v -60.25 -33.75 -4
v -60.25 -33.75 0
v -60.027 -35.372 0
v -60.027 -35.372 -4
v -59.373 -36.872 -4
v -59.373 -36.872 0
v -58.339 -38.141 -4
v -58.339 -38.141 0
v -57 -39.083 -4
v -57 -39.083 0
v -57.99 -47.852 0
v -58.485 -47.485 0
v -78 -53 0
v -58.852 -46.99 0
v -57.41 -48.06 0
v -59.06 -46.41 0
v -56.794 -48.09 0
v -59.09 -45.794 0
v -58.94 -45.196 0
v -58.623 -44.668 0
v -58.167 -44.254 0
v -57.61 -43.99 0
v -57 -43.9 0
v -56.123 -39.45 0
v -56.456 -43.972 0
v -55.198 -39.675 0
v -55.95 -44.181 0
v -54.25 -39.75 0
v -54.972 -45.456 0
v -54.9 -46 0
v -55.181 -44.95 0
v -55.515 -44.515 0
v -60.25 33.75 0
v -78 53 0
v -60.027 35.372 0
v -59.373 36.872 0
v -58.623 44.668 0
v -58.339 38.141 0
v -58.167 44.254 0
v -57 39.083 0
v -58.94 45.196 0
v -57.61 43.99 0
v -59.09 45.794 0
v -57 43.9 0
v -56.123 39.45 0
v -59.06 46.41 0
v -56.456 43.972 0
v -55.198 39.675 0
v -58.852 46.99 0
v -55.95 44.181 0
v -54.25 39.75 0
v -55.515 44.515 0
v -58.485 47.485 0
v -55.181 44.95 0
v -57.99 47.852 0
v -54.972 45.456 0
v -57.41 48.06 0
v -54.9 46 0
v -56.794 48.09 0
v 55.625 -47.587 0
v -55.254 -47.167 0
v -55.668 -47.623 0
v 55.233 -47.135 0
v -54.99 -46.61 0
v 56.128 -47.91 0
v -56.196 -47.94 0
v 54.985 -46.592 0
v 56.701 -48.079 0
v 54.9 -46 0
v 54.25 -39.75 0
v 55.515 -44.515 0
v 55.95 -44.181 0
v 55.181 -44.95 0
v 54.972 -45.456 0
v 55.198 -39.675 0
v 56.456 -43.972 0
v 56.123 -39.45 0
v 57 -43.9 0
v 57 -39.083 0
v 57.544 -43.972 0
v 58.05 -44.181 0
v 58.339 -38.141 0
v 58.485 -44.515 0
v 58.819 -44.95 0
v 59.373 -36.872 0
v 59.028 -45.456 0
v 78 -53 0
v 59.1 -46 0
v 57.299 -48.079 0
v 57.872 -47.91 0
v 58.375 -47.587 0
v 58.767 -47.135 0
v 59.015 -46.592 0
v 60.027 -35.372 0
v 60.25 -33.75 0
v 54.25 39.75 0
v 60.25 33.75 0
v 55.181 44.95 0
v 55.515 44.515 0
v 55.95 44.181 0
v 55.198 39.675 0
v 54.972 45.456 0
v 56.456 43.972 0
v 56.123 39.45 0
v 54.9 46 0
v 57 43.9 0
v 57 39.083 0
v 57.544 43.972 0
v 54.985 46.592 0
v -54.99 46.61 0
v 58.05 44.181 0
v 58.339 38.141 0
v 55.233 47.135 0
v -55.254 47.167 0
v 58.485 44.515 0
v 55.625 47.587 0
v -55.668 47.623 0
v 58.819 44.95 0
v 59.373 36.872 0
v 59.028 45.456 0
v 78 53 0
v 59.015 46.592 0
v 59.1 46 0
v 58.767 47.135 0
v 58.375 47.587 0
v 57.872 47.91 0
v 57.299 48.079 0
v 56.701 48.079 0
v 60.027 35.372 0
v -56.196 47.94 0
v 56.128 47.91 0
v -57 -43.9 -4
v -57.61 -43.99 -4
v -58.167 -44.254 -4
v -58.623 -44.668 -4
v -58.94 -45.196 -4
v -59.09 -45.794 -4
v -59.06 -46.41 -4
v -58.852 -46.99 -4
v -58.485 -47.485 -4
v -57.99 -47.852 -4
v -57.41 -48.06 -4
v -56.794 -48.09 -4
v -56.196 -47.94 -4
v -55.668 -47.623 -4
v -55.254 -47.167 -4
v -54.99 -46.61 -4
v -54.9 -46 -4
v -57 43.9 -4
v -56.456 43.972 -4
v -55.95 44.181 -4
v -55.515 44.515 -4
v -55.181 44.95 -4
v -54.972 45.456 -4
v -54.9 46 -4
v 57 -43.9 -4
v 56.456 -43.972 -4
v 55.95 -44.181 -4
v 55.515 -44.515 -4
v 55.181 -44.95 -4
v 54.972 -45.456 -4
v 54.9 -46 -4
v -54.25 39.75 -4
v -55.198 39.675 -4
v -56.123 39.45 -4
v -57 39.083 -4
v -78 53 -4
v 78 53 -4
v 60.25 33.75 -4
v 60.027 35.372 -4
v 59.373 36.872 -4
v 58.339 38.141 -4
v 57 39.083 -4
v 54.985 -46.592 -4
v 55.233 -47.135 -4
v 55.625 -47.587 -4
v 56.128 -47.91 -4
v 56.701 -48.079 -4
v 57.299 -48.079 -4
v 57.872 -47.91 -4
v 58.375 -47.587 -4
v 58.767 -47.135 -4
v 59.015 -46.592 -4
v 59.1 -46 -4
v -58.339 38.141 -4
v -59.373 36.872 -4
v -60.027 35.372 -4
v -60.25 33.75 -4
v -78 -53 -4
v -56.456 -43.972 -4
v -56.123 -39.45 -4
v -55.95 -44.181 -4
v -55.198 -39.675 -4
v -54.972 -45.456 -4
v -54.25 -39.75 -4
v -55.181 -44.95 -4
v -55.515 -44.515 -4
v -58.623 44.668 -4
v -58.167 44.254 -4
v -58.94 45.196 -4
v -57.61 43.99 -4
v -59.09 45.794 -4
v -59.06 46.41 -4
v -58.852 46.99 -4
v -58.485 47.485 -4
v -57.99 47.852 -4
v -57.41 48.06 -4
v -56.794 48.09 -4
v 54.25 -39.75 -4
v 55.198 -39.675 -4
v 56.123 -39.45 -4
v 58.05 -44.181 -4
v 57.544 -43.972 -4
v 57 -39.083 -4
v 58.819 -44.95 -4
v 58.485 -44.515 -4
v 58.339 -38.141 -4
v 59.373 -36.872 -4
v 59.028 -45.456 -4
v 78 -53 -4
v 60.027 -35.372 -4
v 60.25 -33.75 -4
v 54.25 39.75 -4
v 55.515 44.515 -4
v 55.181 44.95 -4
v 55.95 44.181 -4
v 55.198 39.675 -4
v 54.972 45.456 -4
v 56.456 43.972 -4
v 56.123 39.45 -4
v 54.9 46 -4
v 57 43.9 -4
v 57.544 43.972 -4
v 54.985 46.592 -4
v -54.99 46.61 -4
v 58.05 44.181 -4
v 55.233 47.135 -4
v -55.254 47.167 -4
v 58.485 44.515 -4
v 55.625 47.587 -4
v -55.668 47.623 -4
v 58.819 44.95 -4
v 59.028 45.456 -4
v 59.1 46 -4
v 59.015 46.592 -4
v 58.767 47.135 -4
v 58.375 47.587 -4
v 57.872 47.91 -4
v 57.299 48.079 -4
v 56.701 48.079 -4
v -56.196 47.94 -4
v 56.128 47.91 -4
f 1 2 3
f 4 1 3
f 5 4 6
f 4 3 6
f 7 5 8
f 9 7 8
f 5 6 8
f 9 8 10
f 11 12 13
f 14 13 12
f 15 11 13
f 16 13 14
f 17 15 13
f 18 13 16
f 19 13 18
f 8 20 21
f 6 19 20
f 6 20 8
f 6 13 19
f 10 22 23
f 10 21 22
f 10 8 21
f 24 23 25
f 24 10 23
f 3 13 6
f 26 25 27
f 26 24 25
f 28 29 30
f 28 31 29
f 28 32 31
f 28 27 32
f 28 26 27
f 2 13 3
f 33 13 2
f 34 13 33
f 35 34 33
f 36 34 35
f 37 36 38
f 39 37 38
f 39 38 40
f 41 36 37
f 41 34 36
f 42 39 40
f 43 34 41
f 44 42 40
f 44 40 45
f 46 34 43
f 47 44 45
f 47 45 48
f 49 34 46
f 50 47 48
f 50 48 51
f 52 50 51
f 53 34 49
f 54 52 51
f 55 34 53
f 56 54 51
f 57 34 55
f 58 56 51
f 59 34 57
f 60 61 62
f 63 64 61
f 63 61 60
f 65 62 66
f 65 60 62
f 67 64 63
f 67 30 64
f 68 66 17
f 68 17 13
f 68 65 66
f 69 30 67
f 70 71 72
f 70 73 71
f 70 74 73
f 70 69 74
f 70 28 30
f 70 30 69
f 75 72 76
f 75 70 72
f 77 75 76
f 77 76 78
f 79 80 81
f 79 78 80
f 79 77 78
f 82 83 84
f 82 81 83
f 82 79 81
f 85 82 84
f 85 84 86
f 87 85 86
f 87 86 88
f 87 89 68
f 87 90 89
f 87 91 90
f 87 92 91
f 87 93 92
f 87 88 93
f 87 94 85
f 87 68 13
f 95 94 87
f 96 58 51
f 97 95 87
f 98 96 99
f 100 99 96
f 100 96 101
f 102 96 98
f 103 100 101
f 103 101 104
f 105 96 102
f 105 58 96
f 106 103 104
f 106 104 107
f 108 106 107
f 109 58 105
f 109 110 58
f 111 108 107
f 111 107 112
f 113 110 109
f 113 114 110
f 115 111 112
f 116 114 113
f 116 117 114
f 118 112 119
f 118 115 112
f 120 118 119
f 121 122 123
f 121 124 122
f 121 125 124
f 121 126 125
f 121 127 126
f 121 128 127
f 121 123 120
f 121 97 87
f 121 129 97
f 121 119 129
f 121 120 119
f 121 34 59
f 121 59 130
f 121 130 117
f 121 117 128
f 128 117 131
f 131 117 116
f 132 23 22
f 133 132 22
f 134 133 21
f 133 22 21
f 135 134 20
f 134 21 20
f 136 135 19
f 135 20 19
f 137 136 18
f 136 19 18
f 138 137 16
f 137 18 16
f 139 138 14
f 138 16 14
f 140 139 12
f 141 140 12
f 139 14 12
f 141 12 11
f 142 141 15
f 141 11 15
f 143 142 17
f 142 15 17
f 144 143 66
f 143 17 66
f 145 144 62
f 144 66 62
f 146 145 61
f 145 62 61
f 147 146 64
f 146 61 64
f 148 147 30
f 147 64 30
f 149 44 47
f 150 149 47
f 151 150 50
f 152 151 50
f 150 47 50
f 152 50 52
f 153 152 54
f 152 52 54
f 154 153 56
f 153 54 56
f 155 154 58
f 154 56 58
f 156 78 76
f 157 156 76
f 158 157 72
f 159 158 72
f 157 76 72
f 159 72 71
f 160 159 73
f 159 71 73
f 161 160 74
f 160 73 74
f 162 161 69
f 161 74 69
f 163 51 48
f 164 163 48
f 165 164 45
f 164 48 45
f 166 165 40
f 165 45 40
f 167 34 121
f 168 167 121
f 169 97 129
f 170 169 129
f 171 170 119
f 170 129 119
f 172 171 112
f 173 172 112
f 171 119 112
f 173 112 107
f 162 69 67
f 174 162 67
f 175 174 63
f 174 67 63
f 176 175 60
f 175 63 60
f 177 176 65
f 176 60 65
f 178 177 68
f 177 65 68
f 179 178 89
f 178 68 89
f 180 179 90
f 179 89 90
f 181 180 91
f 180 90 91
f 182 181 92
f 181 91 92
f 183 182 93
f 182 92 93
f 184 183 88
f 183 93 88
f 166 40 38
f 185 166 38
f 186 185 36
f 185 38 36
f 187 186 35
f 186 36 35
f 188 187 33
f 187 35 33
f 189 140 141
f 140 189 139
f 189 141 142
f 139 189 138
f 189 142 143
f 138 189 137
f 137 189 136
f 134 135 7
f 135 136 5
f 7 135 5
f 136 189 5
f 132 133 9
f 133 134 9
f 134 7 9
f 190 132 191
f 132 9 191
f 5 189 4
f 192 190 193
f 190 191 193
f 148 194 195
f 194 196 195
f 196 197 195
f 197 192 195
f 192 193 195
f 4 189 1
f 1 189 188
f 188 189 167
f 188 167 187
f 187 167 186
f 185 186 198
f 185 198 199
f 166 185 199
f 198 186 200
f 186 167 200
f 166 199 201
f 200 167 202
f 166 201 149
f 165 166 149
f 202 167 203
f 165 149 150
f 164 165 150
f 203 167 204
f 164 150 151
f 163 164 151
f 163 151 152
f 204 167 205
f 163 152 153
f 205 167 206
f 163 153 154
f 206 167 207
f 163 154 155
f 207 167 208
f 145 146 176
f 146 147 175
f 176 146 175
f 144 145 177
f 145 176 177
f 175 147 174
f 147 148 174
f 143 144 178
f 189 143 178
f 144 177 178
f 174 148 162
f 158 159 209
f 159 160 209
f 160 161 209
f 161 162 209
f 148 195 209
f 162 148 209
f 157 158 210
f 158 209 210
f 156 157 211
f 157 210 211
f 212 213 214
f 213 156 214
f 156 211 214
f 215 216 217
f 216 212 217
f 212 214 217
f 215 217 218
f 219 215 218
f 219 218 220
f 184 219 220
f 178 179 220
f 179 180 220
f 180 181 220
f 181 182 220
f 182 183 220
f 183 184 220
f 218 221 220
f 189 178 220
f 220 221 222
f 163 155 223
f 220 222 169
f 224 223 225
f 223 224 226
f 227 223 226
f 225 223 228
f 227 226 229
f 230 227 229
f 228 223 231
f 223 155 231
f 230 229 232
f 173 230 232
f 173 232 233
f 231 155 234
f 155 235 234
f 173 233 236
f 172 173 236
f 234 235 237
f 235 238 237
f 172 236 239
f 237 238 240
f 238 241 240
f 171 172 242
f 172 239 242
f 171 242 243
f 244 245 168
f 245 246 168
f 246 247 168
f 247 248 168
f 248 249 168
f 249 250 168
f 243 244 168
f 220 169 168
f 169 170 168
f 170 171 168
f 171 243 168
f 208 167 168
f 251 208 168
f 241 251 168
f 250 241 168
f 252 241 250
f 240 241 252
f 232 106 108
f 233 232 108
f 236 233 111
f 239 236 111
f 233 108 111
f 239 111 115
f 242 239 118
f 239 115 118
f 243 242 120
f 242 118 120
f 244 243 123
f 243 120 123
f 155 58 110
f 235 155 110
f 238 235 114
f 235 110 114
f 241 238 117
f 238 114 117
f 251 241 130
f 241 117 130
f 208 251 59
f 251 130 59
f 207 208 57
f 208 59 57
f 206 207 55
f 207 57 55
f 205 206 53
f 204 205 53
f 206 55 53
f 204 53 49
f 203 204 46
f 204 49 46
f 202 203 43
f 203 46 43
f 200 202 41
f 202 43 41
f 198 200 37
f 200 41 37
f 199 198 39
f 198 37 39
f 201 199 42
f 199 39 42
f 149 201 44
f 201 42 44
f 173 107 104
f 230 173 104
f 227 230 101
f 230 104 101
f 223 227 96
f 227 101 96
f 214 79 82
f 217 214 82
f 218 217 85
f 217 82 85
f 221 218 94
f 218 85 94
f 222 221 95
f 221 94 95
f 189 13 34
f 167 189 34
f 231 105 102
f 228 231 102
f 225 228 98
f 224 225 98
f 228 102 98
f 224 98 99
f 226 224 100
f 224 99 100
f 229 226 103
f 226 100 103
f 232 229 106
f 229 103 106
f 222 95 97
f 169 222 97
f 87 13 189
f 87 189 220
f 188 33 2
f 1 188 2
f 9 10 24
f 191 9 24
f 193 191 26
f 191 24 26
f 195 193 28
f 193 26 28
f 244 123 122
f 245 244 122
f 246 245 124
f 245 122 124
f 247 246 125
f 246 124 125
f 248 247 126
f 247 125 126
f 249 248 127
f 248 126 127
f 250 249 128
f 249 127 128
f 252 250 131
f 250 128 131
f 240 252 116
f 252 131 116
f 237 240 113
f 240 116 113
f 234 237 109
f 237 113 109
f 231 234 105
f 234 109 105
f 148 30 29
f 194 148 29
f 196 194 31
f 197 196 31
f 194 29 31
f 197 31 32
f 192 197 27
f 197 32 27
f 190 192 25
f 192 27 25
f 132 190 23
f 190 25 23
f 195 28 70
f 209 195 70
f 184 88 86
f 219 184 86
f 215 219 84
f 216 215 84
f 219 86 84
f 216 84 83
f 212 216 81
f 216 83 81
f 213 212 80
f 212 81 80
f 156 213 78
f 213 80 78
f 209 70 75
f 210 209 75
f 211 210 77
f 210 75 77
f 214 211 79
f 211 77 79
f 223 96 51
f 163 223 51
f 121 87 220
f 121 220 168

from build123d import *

# Parameters (mm, degrees)
SKETCH1_W           = 156
SKETCH1_H           = 106
BOSS_EXTRUDE1_DEPTH = 4
CUT_EXTRUDE1_REACH  = 96.387


with BuildPart() as part:
    # Sketch1 → Boss-Extrude1 (new body)
    with BuildSketch(Plane.XY):
        Rectangle(SKETCH1_W, SKETCH1_H)
    extrude(amount=-BOSS_EXTRUDE1_DEPTH)

    # Sketch2 → Cut-Extrude1 (cut, up to next)
    with BuildSketch(Plane.XY, mode=Mode.PRIVATE) as cut_extrude1_sk1:
        with BuildLine():
            ThreePointArc((60.25, 33.75), (59.373475383, 36.872498999), (57, 39.082682252))
            Line((57, 39.082682252), (57, -39.082682252))
            ThreePointArc((57, -39.082682252), (59.373475383, -36.872498999), (60.25, -33.75))
            Line((60.25, -33.75), (60.25, 33.75))
        make_face()
    cut_extrude1_tool1 = extrude(cut_extrude1_sk1.sketch, amount=-CUT_EXTRUDE1_REACH, mode=Mode.PRIVATE) & part.part
    # Sketch2 → Cut-Extrude1 (cut, up to next)
    with BuildSketch(Plane.XY, mode=Mode.PRIVATE) as cut_extrude1_sk2:
        with BuildLine():
            ThreePointArc((-54.25, 39.75), (-55.66490397, 39.580784403), (-57, 39.082682252))
            Line((-57, 39.082682252), (-57, -39.082682252))
            ThreePointArc((-57, -39.082682252), (-55.66490397, -39.580784403), (-54.25, -39.75))
            Line((-54.25, -39.75), (54.25, -39.75))
            ThreePointArc((54.25, -39.75), (55.66490397, -39.580784403), (57, -39.082682252))
            Line((57, -39.082682252), (57, 39.082682252))
            ThreePointArc((57, 39.082682252), (55.66490397, 39.580784403), (54.25, 39.75))
            Line((54.25, 39.75), (-54.25, 39.75))
        make_face()
    cut_extrude1_tool2 = extrude(cut_extrude1_sk2.sketch, amount=-CUT_EXTRUDE1_REACH, mode=Mode.PRIVATE) & part.part
    # Sketch2 → Cut-Extrude1 (cut, up to next)
    with BuildSketch(Plane.XY, mode=Mode.PRIVATE) as cut_extrude1_sk3:
        with BuildLine():
            Line((-57, -39.082682252), (-57, 39.082682252))
            ThreePointArc((-57, 39.082682252), (-59.373475383, 36.872498999), (-60.25, 33.75))
            Line((-60.25, 33.75), (-60.25, -33.75))
            ThreePointArc((-60.25, -33.75), (-59.373475383, -36.872498999), (-57, -39.082682252))
        make_face()
    cut_extrude1_tool3 = extrude(cut_extrude1_sk3.sketch, amount=-CUT_EXTRUDE1_REACH, mode=Mode.PRIVATE) & part.part
    # Sketch2 → Cut-Extrude1 (cut, up to next)
    with BuildSketch(Plane.XY, mode=Mode.PRIVATE) as cut_extrude1_sk4:
        with BuildLine():
            ThreePointArc((59.1, 46), (57, 48.1), (54.9, 46))
            Line((54.9, 46), (57, 46))
            Line((57, 46), (57, 43.9))
            ThreePointArc((57, 43.9), (58.48492424, 44.51507576), (59.1, 46))
        make_face()
    cut_extrude1_tool4 = extrude(cut_extrude1_sk4.sketch, amount=-CUT_EXTRUDE1_REACH, mode=Mode.PRIVATE) & part.part
    # Sketch2 → Cut-Extrude1 (cut, up to next)
    with BuildSketch(Plane.XY, mode=Mode.PRIVATE) as cut_extrude1_sk5:
        with BuildLine():
            Line((57, 46), (54.9, 46))
            ThreePointArc((54.9, 46), (55.51507576, 44.51507576), (57, 43.9))
            Line((57, 43.9), (57, 46))
        make_face()
    cut_extrude1_tool5 = extrude(cut_extrude1_sk5.sketch, amount=-CUT_EXTRUDE1_REACH, mode=Mode.PRIVATE) & part.part
    # Sketch2 → Cut-Extrude1 (cut, up to next)
    with BuildSketch(Plane.XY, mode=Mode.PRIVATE) as cut_extrude1_sk6:
        with BuildLine():
            ThreePointArc((59.1, 46), (57, 48.1), (54.9, 46))
            Line((54.9, 46), (57, 46))
            Line((57, 46), (57, 43.9))
            ThreePointArc((57, 43.9), (58.48492424, 44.51507576), (59.1, 46))
        make_face()
    cut_extrude1_tool6 = extrude(cut_extrude1_sk6.sketch, amount=-CUT_EXTRUDE1_REACH, mode=Mode.PRIVATE) & part.part
    # Sketch2 → Cut-Extrude1 (cut, up to next)
    with BuildSketch(Plane.XY, mode=Mode.PRIVATE) as cut_extrude1_sk7:
        with BuildLine():
            Line((57, 46), (54.9, 46))
            ThreePointArc((54.9, 46), (55.51507576, 44.51507576), (57, 43.9))
            Line((57, 43.9), (57, 46))
        make_face()
    cut_extrude1_tool7 = extrude(cut_extrude1_sk7.sketch, amount=-CUT_EXTRUDE1_REACH, mode=Mode.PRIVATE) & part.part
    # Sketch2 → Cut-Extrude1 (cut, up to next)
    with BuildSketch(Plane.XY, mode=Mode.PRIVATE) as cut_extrude1_sk8:
        with BuildLine():
            Line((-57, 43.9), (-57, 46))
            Line((-57, 46), (-54.9, 46))
            ThreePointArc((-54.9, 46), (-58.48492424, 47.48492424), (-57, 43.9))
        make_face()
    cut_extrude1_tool8 = extrude(cut_extrude1_sk8.sketch, amount=-CUT_EXTRUDE1_REACH, mode=Mode.PRIVATE) & part.part
    # Sketch2 → Cut-Extrude1 (cut, up to next)
    with BuildSketch(Plane.XY, mode=Mode.PRIVATE) as cut_extrude1_sk9:
        with BuildLine():
            Line((-54.9, 46), (-57, 46))
            Line((-57, 46), (-57, 43.9))
            ThreePointArc((-57, 43.9), (-55.51507576, 44.51507576), (-54.9, 46))
        make_face()
    cut_extrude1_tool9 = extrude(cut_extrude1_sk9.sketch, amount=-CUT_EXTRUDE1_REACH, mode=Mode.PRIVATE) & part.part
    # Sketch2 → Cut-Extrude1 (cut, up to next)
    with BuildSketch(Plane.XY, mode=Mode.PRIVATE) as cut_extrude1_sk10:
        with BuildLine():
            Line((-57, 43.9), (-57, 46))
            Line((-57, 46), (-54.9, 46))
            ThreePointArc((-54.9, 46), (-58.48492424, 47.48492424), (-57, 43.9))
        make_face()
    cut_extrude1_tool10 = extrude(cut_extrude1_sk10.sketch, amount=-CUT_EXTRUDE1_REACH, mode=Mode.PRIVATE) & part.part
    # Sketch2 → Cut-Extrude1 (cut, up to next)
    with BuildSketch(Plane.XY, mode=Mode.PRIVATE) as cut_extrude1_sk11:
        with BuildLine():
            Line((-54.9, 46), (-57, 46))
            Line((-57, 46), (-57, 43.9))
            ThreePointArc((-57, 43.9), (-55.51507576, 44.51507576), (-54.9, 46))
        make_face()
    cut_extrude1_tool11 = extrude(cut_extrude1_sk11.sketch, amount=-CUT_EXTRUDE1_REACH, mode=Mode.PRIVATE) & part.part
    # Sketch2 → Cut-Extrude1 (cut, up to next)
    with BuildSketch(Plane.XY, mode=Mode.PRIVATE) as cut_extrude1_sk12:
        with BuildLine():
            ThreePointArc((-54.9, -46), (-55.51507576, -44.51507576), (-57, -43.9))
            Line((-57, -43.9), (-57, -46))
            Line((-57, -46), (-54.9, -46))
        make_face()
    cut_extrude1_tool12 = extrude(cut_extrude1_sk12.sketch, amount=-CUT_EXTRUDE1_REACH, mode=Mode.PRIVATE) & part.part
    # Sketch2 → Cut-Extrude1 (cut, up to next)
    with BuildSketch(Plane.XY, mode=Mode.PRIVATE) as cut_extrude1_sk13:
        with BuildLine():
            Line((-57, -46), (-57, -43.9))
            ThreePointArc((-57, -43.9), (-58.48492424, -47.48492424), (-54.9, -46))
            Line((-54.9, -46), (-57, -46))
        make_face()
    cut_extrude1_tool13 = extrude(cut_extrude1_sk13.sketch, amount=-CUT_EXTRUDE1_REACH, mode=Mode.PRIVATE) & part.part
    # Sketch2 → Cut-Extrude1 (cut, up to next)
    with BuildSketch(Plane.XY, mode=Mode.PRIVATE) as cut_extrude1_sk14:
        with BuildLine():
            ThreePointArc((-54.9, -46), (-55.51507576, -44.51507576), (-57, -43.9))
            Line((-57, -43.9), (-57, -46))
            Line((-57, -46), (-54.9, -46))
        make_face()
    cut_extrude1_tool14 = extrude(cut_extrude1_sk14.sketch, amount=-CUT_EXTRUDE1_REACH, mode=Mode.PRIVATE) & part.part
    # Sketch2 → Cut-Extrude1 (cut, up to next)
    with BuildSketch(Plane.XY, mode=Mode.PRIVATE) as cut_extrude1_sk15:
        with BuildLine():
            Line((-57, -46), (-57, -43.9))
            ThreePointArc((-57, -43.9), (-58.48492424, -47.48492424), (-54.9, -46))
            Line((-54.9, -46), (-57, -46))
        make_face()
    cut_extrude1_tool15 = extrude(cut_extrude1_sk15.sketch, amount=-CUT_EXTRUDE1_REACH, mode=Mode.PRIVATE) & part.part
    # Sketch2 → Cut-Extrude1 (cut, up to next)
    with BuildSketch(Plane.XY, mode=Mode.PRIVATE) as cut_extrude1_sk16:
        with BuildLine():
            ThreePointArc((59.1, -46), (58.48492424, -44.51507576), (57, -43.9))
            Line((57, -43.9), (57, -46))
            Line((57, -46), (54.9, -46))
            ThreePointArc((54.9, -46), (57, -48.1), (59.1, -46))
        make_face()
    cut_extrude1_tool16 = extrude(cut_extrude1_sk16.sketch, amount=-CUT_EXTRUDE1_REACH, mode=Mode.PRIVATE) & part.part
    # Sketch2 → Cut-Extrude1 (cut, up to next)
    with BuildSketch(Plane.XY, mode=Mode.PRIVATE) as cut_extrude1_sk17:
        with BuildLine():
            Line((57, -46), (57, -43.9))
            ThreePointArc((57, -43.9), (55.51507576, -44.51507576), (54.9, -46))
            Line((54.9, -46), (57, -46))
        make_face()
    cut_extrude1_tool17 = extrude(cut_extrude1_sk17.sketch, amount=-CUT_EXTRUDE1_REACH, mode=Mode.PRIVATE) & part.part
    # Sketch2 → Cut-Extrude1 (cut, up to next)
    with BuildSketch(Plane.XY, mode=Mode.PRIVATE) as cut_extrude1_sk18:
        with BuildLine():
            ThreePointArc((59.1, -46), (58.48492424, -44.51507576), (57, -43.9))
            Line((57, -43.9), (57, -46))
            Line((57, -46), (54.9, -46))
            ThreePointArc((54.9, -46), (57, -48.1), (59.1, -46))
        make_face()
    cut_extrude1_tool18 = extrude(cut_extrude1_sk18.sketch, amount=-CUT_EXTRUDE1_REACH, mode=Mode.PRIVATE) & part.part
    # Sketch2 → Cut-Extrude1 (cut, up to next)
    with BuildSketch(Plane.XY, mode=Mode.PRIVATE) as cut_extrude1_sk19:
        with BuildLine():
            Line((57, -46), (57, -43.9))
            ThreePointArc((57, -43.9), (55.51507576, -44.51507576), (54.9, -46))
            Line((54.9, -46), (57, -46))
        make_face()
    cut_extrude1_tool19 = extrude(cut_extrude1_sk19.sketch, amount=-CUT_EXTRUDE1_REACH, mode=Mode.PRIVATE) & part.part
    add(cut_extrude1_tool1.solids().sort_by_distance((58.595694, 0, 0))[0], mode=Mode.SUBTRACT)
    add(cut_extrude1_tool2.solids().sort_by_distance((0, 0, 0))[0], mode=Mode.SUBTRACT)
    add(cut_extrude1_tool3.solids().sort_by_distance((-58.595694, 0, 0))[0], mode=Mode.SUBTRACT)
    add(cut_extrude1_tool4.solids().sort_by_distance((57.297089, 46.297089, 0))[0], mode=Mode.SUBTRACT)
    add(cut_extrude1_tool5.solids().sort_by_distance((56.108732, 45.108732, 0))[0], mode=Mode.SUBTRACT)
    add(cut_extrude1_tool6.solids().sort_by_distance((57.297089, 46.297089, 0))[0], mode=Mode.SUBTRACT)
    add(cut_extrude1_tool7.solids().sort_by_distance((56.108732, 45.108732, 0))[0], mode=Mode.SUBTRACT)
    add(cut_extrude1_tool8.solids().sort_by_distance((-57.297089, 46.297089, 0))[0], mode=Mode.SUBTRACT)
    add(cut_extrude1_tool9.solids().sort_by_distance((-56.108732, 45.108732, 0))[0], mode=Mode.SUBTRACT)
    add(cut_extrude1_tool10.solids().sort_by_distance((-57.297089, 46.297089, 0))[0], mode=Mode.SUBTRACT)
    add(cut_extrude1_tool11.solids().sort_by_distance((-56.108732, 45.108732, 0))[0], mode=Mode.SUBTRACT)
    add(cut_extrude1_tool12.solids().sort_by_distance((-56.108732, -45.108732, 0))[0], mode=Mode.SUBTRACT)
    add(cut_extrude1_tool13.solids().sort_by_distance((-57.297089, -46.297089, 0))[0], mode=Mode.SUBTRACT)
    add(cut_extrude1_tool14.solids().sort_by_distance((-56.108732, -45.108732, 0))[0], mode=Mode.SUBTRACT)
    add(cut_extrude1_tool15.solids().sort_by_distance((-57.297089, -46.297089, 0))[0], mode=Mode.SUBTRACT)
    add(cut_extrude1_tool16.solids().sort_by_distance((57.297089, -46.297089, 0))[0], mode=Mode.SUBTRACT)
    add(cut_extrude1_tool17.solids().sort_by_distance((56.108732, -45.108732, 0))[0], mode=Mode.SUBTRACT)
    add(cut_extrude1_tool18.solids().sort_by_distance((57.297089, -46.297089, 0))[0], mode=Mode.SUBTRACT)
    add(cut_extrude1_tool19.solids().sort_by_distance((56.108732, -45.108732, 0))[0], mode=Mode.SUBTRACT)


solid = part.part
